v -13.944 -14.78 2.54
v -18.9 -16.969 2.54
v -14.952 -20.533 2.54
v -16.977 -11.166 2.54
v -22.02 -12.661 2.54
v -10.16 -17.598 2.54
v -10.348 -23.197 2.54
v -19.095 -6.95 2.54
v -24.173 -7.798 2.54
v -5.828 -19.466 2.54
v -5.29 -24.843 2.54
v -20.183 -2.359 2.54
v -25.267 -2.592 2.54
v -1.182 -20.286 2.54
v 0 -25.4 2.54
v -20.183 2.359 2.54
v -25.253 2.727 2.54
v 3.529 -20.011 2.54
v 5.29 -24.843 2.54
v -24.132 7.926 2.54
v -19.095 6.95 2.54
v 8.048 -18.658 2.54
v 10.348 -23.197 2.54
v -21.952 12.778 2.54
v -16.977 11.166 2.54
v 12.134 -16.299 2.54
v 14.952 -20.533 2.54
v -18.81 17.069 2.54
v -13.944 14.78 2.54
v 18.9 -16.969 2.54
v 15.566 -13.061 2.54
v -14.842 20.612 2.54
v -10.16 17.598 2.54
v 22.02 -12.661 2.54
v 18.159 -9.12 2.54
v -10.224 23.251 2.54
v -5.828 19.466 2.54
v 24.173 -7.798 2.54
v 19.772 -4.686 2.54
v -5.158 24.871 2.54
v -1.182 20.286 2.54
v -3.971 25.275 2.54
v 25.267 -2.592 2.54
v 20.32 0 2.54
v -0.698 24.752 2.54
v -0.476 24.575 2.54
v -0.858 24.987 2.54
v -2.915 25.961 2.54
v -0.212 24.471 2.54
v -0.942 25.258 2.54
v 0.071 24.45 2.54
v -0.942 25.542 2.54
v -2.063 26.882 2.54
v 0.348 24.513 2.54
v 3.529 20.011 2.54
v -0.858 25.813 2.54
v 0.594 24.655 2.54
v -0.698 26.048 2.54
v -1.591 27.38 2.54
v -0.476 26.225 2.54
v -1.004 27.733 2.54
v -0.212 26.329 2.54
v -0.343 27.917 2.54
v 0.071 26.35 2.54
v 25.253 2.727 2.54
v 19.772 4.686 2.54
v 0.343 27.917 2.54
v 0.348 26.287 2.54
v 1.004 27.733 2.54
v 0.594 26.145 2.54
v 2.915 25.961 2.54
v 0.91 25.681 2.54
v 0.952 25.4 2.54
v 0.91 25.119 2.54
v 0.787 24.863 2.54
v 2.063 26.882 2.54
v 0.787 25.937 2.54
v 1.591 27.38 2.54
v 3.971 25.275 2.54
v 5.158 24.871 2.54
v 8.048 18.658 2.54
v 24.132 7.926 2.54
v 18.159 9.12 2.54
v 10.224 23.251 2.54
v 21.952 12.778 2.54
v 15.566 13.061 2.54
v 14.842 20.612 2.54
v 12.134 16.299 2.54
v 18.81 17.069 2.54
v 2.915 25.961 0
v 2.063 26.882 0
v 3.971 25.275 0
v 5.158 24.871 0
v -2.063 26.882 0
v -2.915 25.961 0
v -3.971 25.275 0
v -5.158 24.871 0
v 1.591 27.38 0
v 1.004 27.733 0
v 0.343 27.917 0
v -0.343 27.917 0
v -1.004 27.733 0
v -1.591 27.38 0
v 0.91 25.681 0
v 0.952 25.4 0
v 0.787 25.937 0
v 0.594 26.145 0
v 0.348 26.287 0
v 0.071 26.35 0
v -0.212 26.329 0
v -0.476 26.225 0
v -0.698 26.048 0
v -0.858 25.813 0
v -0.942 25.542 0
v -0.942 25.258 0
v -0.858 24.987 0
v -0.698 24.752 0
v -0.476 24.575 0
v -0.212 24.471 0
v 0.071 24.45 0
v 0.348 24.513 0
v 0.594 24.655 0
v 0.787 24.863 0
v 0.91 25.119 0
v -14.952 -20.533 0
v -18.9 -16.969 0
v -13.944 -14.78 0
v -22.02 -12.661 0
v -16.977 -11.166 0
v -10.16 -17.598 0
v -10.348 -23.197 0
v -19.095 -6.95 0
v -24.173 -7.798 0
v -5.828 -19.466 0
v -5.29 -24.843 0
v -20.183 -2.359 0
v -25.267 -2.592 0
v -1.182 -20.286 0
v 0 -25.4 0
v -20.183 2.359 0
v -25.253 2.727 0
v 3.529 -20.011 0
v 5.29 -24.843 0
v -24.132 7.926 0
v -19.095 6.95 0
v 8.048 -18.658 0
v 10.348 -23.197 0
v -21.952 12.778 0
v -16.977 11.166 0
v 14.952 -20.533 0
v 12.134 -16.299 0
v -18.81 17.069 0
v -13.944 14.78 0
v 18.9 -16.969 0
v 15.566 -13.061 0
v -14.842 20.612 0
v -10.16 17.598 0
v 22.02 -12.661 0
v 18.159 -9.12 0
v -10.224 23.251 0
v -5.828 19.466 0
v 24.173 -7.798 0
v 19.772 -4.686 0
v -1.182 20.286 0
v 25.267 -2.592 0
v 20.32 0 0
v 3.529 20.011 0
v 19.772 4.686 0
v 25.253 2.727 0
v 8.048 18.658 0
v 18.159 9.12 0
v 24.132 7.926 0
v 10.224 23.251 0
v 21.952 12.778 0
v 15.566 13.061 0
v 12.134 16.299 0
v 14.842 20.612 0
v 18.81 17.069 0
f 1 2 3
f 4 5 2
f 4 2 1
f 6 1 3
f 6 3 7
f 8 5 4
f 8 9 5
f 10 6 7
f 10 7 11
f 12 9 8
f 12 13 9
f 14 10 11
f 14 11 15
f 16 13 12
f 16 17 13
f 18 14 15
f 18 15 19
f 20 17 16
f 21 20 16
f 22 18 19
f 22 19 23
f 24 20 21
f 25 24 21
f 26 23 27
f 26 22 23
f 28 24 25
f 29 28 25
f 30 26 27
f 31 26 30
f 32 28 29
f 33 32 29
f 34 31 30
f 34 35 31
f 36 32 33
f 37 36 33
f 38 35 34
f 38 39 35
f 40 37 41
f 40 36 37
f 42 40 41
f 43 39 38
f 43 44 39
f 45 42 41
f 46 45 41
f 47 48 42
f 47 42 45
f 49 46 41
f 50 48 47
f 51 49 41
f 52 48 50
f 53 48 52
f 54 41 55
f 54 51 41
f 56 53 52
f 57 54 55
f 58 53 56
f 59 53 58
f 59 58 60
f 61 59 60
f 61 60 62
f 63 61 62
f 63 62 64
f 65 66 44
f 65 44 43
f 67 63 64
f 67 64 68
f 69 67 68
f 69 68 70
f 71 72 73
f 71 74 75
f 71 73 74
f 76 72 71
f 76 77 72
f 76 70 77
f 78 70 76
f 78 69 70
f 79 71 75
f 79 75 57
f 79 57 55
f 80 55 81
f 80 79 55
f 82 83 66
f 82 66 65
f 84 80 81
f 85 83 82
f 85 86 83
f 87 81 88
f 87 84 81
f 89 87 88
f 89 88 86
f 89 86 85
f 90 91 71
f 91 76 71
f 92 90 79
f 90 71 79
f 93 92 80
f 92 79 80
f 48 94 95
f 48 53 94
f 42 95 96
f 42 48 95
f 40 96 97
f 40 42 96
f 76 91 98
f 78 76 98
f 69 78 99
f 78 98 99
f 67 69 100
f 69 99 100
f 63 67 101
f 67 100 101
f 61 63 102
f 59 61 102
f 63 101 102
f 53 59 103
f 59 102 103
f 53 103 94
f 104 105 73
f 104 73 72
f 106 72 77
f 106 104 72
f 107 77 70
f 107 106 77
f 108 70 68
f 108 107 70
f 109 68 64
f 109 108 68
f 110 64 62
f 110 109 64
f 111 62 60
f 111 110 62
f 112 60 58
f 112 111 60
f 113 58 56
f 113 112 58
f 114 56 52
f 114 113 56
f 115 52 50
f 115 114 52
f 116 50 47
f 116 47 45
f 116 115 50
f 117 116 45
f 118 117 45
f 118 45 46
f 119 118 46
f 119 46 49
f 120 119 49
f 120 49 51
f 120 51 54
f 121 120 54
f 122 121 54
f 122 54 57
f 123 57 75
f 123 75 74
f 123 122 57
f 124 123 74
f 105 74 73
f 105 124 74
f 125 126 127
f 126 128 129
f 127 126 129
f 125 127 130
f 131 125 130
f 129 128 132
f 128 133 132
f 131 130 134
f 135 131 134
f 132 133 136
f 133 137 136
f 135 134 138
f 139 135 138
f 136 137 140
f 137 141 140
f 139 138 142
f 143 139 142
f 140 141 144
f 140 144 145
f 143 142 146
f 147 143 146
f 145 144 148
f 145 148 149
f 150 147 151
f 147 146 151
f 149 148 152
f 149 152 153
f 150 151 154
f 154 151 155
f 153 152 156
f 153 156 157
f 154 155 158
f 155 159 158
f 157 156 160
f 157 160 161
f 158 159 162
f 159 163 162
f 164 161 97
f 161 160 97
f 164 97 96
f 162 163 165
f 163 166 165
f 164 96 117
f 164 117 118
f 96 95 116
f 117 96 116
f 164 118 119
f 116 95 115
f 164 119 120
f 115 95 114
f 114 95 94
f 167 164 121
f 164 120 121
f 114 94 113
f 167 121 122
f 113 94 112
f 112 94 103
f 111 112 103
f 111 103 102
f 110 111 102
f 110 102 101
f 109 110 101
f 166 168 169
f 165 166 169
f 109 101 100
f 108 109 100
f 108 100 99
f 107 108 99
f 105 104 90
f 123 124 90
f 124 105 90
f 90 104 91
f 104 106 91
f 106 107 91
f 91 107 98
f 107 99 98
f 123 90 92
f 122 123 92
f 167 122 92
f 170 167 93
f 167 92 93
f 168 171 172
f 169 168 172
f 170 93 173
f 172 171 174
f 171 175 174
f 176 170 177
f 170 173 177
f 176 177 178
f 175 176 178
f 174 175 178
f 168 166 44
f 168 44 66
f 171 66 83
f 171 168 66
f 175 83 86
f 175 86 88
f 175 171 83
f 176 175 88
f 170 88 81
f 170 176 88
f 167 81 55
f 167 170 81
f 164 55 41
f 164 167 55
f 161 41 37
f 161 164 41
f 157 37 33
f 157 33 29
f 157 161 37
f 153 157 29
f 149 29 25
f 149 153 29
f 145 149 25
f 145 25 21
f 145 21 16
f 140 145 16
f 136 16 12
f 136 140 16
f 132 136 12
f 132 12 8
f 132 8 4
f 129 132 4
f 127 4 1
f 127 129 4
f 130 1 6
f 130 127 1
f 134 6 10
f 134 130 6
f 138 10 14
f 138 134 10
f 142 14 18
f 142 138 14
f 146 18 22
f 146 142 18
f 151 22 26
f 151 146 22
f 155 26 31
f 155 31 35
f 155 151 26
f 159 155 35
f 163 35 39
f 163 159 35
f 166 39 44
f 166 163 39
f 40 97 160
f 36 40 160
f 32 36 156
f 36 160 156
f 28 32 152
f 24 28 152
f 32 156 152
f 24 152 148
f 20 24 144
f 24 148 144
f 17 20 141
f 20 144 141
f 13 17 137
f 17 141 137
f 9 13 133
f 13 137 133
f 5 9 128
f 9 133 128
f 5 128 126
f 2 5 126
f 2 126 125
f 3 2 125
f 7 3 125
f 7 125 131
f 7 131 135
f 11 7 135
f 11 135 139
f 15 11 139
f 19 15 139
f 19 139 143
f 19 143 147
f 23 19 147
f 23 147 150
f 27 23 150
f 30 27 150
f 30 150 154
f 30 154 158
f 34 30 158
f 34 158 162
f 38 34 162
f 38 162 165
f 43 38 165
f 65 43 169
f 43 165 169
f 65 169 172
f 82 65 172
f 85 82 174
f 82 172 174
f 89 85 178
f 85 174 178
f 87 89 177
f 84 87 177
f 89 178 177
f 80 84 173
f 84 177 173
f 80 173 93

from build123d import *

# Parameters (mm, degrees)
F0_R     = 20.32
F0_R_2   = 0.9525
F1_DEPTH = 2.54
F2_R     = 5.08


with BuildPart() as f1:
    # F0 (on Top) → F1 (new body)
    with BuildSketch(Plane.XY):
        with BuildLine():
            ThreePointArc((2.5368230131, 25.273), (0, 27.94), (-2.5368230131, 25.273))
            ThreePointArc((-2.5368230131, 25.273), (0, -25.4), (2.5368230131, 25.273))
        make_face()
        Circle(F0_R, mode=Mode.SUBTRACT)
        with Locations((0, 25.4)):
            Circle(F0_R_2, mode=Mode.SUBTRACT)
    extrude(amount=F1_DEPTH)

    # F2
    f2_edges = [f1.edges().sort_by_distance(p)[0] for p in [
        (-2.536823, 25.273, 1.27),
        (2.536823, 25.273, 1.27),
    ]]
    fillet(f2_edges, radius=F2_R)


solid = f1.part
